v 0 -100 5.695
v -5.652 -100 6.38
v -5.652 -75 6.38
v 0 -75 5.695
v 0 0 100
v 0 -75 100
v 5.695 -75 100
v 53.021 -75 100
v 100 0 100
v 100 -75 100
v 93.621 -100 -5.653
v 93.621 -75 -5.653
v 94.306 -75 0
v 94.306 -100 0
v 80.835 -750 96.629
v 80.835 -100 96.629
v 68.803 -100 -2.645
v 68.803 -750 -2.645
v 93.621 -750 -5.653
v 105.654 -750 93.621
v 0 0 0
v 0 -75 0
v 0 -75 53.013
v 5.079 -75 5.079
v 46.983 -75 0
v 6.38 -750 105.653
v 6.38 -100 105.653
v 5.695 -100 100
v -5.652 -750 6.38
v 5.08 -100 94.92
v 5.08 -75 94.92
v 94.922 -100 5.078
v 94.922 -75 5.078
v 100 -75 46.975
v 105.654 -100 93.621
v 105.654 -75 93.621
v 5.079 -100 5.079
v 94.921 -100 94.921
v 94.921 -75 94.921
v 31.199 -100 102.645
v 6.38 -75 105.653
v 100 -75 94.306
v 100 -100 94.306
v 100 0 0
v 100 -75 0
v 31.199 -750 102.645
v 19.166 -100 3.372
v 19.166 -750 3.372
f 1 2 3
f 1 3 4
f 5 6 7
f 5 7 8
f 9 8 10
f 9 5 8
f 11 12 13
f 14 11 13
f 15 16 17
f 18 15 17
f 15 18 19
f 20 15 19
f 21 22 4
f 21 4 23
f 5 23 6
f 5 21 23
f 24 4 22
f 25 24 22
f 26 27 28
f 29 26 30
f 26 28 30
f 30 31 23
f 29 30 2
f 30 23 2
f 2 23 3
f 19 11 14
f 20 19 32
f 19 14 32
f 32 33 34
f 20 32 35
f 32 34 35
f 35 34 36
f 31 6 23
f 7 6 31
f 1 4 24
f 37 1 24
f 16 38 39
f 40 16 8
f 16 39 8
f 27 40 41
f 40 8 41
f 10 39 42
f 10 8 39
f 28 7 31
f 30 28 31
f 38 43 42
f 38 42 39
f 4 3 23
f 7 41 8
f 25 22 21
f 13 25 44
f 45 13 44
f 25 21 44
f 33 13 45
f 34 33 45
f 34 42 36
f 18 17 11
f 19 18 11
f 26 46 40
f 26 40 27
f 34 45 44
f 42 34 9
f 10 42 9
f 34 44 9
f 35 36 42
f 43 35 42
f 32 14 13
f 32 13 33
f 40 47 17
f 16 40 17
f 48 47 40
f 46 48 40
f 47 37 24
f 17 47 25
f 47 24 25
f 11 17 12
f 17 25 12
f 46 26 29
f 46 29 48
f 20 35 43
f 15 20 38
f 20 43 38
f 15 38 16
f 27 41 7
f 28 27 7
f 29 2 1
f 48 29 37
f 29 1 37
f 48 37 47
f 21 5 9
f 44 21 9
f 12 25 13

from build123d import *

# Parameters (mm, degrees)
F0_W     = 100
F0_H     = 100
F1_DEPTH = 75
F3_DEPTH = 25
F5_DEPTH = 650


# Not quite as in the source:
# - a feature names something its author has since deleted; it is built from what else it names


with BuildPart() as f1:
    # F0 (on Front) → F1 (new body)
    with BuildSketch(Plane.XZ):
        with Locations((50, 50)):
            Rectangle(F0_W, F0_H)
    extrude(amount=F1_DEPTH)

    # F2 (on face) → F3 (join)
    with BuildSketch(Plane.XZ.offset(75)):
        Polygon((100, 94.3057966884), (100, 46.974800806), (105.6538372319, 93.6205058254), align=None)
        Polygon((94.9213680166, 94.9213680166), (50, 50), (94.9217934551, 5.0782065449), (100, 46.974800806), (100, 94.3057966884), align=None)
        Polygon((0, 53.0131088143), (-5.6523319044, 6.3798231584), (0, 5.6947147534), align=None)
        Polygon((6.3804113302, 105.6532490601), (5.6951917585, 100), (53.0212637714, 100), align=None)
        Polygon((94.3062736934, 0), (46.9829557631, 0), (93.6210939972, -5.6529200762), align=None)
        Polygon((5.6951917585, 100), (5.0795135743, 94.9204864257), (50, 50), (94.9213680166, 94.9213680166), (53.0212637714, 100), align=None)
        Polygon((50, 50), (5.0790881358, 5.0790881358), (46.9829557631, 0), (94.3062736934, 0), (94.9217934551, 5.0782065449), align=None)
        Polygon((5.0795135743, 94.9204864257), (0, 53.0131088143), (0, 5.6947147534), (5.0790881358, 5.0790881358), (50, 50), align=None)
    extrude(amount=F3_DEPTH)

    # F4 (on face) → F5 (join)
    with BuildSketch(Plane.XZ.offset(100)):
        Polygon((31.1987678056, 102.6450632514), (6.3804113302, 105.6532490601), (-5.6523319044, 6.3798231584), (19.166024571, 3.3716373498), align=None)
        Polygon((93.6210939972, -5.6529200762), (105.6538372319, 93.6205058254), (80.8354807565, 96.6286916341), (68.8027375218, -2.6447342676), align=None)
    extrude(amount=F5_DEPTH)


solid = f1.part
